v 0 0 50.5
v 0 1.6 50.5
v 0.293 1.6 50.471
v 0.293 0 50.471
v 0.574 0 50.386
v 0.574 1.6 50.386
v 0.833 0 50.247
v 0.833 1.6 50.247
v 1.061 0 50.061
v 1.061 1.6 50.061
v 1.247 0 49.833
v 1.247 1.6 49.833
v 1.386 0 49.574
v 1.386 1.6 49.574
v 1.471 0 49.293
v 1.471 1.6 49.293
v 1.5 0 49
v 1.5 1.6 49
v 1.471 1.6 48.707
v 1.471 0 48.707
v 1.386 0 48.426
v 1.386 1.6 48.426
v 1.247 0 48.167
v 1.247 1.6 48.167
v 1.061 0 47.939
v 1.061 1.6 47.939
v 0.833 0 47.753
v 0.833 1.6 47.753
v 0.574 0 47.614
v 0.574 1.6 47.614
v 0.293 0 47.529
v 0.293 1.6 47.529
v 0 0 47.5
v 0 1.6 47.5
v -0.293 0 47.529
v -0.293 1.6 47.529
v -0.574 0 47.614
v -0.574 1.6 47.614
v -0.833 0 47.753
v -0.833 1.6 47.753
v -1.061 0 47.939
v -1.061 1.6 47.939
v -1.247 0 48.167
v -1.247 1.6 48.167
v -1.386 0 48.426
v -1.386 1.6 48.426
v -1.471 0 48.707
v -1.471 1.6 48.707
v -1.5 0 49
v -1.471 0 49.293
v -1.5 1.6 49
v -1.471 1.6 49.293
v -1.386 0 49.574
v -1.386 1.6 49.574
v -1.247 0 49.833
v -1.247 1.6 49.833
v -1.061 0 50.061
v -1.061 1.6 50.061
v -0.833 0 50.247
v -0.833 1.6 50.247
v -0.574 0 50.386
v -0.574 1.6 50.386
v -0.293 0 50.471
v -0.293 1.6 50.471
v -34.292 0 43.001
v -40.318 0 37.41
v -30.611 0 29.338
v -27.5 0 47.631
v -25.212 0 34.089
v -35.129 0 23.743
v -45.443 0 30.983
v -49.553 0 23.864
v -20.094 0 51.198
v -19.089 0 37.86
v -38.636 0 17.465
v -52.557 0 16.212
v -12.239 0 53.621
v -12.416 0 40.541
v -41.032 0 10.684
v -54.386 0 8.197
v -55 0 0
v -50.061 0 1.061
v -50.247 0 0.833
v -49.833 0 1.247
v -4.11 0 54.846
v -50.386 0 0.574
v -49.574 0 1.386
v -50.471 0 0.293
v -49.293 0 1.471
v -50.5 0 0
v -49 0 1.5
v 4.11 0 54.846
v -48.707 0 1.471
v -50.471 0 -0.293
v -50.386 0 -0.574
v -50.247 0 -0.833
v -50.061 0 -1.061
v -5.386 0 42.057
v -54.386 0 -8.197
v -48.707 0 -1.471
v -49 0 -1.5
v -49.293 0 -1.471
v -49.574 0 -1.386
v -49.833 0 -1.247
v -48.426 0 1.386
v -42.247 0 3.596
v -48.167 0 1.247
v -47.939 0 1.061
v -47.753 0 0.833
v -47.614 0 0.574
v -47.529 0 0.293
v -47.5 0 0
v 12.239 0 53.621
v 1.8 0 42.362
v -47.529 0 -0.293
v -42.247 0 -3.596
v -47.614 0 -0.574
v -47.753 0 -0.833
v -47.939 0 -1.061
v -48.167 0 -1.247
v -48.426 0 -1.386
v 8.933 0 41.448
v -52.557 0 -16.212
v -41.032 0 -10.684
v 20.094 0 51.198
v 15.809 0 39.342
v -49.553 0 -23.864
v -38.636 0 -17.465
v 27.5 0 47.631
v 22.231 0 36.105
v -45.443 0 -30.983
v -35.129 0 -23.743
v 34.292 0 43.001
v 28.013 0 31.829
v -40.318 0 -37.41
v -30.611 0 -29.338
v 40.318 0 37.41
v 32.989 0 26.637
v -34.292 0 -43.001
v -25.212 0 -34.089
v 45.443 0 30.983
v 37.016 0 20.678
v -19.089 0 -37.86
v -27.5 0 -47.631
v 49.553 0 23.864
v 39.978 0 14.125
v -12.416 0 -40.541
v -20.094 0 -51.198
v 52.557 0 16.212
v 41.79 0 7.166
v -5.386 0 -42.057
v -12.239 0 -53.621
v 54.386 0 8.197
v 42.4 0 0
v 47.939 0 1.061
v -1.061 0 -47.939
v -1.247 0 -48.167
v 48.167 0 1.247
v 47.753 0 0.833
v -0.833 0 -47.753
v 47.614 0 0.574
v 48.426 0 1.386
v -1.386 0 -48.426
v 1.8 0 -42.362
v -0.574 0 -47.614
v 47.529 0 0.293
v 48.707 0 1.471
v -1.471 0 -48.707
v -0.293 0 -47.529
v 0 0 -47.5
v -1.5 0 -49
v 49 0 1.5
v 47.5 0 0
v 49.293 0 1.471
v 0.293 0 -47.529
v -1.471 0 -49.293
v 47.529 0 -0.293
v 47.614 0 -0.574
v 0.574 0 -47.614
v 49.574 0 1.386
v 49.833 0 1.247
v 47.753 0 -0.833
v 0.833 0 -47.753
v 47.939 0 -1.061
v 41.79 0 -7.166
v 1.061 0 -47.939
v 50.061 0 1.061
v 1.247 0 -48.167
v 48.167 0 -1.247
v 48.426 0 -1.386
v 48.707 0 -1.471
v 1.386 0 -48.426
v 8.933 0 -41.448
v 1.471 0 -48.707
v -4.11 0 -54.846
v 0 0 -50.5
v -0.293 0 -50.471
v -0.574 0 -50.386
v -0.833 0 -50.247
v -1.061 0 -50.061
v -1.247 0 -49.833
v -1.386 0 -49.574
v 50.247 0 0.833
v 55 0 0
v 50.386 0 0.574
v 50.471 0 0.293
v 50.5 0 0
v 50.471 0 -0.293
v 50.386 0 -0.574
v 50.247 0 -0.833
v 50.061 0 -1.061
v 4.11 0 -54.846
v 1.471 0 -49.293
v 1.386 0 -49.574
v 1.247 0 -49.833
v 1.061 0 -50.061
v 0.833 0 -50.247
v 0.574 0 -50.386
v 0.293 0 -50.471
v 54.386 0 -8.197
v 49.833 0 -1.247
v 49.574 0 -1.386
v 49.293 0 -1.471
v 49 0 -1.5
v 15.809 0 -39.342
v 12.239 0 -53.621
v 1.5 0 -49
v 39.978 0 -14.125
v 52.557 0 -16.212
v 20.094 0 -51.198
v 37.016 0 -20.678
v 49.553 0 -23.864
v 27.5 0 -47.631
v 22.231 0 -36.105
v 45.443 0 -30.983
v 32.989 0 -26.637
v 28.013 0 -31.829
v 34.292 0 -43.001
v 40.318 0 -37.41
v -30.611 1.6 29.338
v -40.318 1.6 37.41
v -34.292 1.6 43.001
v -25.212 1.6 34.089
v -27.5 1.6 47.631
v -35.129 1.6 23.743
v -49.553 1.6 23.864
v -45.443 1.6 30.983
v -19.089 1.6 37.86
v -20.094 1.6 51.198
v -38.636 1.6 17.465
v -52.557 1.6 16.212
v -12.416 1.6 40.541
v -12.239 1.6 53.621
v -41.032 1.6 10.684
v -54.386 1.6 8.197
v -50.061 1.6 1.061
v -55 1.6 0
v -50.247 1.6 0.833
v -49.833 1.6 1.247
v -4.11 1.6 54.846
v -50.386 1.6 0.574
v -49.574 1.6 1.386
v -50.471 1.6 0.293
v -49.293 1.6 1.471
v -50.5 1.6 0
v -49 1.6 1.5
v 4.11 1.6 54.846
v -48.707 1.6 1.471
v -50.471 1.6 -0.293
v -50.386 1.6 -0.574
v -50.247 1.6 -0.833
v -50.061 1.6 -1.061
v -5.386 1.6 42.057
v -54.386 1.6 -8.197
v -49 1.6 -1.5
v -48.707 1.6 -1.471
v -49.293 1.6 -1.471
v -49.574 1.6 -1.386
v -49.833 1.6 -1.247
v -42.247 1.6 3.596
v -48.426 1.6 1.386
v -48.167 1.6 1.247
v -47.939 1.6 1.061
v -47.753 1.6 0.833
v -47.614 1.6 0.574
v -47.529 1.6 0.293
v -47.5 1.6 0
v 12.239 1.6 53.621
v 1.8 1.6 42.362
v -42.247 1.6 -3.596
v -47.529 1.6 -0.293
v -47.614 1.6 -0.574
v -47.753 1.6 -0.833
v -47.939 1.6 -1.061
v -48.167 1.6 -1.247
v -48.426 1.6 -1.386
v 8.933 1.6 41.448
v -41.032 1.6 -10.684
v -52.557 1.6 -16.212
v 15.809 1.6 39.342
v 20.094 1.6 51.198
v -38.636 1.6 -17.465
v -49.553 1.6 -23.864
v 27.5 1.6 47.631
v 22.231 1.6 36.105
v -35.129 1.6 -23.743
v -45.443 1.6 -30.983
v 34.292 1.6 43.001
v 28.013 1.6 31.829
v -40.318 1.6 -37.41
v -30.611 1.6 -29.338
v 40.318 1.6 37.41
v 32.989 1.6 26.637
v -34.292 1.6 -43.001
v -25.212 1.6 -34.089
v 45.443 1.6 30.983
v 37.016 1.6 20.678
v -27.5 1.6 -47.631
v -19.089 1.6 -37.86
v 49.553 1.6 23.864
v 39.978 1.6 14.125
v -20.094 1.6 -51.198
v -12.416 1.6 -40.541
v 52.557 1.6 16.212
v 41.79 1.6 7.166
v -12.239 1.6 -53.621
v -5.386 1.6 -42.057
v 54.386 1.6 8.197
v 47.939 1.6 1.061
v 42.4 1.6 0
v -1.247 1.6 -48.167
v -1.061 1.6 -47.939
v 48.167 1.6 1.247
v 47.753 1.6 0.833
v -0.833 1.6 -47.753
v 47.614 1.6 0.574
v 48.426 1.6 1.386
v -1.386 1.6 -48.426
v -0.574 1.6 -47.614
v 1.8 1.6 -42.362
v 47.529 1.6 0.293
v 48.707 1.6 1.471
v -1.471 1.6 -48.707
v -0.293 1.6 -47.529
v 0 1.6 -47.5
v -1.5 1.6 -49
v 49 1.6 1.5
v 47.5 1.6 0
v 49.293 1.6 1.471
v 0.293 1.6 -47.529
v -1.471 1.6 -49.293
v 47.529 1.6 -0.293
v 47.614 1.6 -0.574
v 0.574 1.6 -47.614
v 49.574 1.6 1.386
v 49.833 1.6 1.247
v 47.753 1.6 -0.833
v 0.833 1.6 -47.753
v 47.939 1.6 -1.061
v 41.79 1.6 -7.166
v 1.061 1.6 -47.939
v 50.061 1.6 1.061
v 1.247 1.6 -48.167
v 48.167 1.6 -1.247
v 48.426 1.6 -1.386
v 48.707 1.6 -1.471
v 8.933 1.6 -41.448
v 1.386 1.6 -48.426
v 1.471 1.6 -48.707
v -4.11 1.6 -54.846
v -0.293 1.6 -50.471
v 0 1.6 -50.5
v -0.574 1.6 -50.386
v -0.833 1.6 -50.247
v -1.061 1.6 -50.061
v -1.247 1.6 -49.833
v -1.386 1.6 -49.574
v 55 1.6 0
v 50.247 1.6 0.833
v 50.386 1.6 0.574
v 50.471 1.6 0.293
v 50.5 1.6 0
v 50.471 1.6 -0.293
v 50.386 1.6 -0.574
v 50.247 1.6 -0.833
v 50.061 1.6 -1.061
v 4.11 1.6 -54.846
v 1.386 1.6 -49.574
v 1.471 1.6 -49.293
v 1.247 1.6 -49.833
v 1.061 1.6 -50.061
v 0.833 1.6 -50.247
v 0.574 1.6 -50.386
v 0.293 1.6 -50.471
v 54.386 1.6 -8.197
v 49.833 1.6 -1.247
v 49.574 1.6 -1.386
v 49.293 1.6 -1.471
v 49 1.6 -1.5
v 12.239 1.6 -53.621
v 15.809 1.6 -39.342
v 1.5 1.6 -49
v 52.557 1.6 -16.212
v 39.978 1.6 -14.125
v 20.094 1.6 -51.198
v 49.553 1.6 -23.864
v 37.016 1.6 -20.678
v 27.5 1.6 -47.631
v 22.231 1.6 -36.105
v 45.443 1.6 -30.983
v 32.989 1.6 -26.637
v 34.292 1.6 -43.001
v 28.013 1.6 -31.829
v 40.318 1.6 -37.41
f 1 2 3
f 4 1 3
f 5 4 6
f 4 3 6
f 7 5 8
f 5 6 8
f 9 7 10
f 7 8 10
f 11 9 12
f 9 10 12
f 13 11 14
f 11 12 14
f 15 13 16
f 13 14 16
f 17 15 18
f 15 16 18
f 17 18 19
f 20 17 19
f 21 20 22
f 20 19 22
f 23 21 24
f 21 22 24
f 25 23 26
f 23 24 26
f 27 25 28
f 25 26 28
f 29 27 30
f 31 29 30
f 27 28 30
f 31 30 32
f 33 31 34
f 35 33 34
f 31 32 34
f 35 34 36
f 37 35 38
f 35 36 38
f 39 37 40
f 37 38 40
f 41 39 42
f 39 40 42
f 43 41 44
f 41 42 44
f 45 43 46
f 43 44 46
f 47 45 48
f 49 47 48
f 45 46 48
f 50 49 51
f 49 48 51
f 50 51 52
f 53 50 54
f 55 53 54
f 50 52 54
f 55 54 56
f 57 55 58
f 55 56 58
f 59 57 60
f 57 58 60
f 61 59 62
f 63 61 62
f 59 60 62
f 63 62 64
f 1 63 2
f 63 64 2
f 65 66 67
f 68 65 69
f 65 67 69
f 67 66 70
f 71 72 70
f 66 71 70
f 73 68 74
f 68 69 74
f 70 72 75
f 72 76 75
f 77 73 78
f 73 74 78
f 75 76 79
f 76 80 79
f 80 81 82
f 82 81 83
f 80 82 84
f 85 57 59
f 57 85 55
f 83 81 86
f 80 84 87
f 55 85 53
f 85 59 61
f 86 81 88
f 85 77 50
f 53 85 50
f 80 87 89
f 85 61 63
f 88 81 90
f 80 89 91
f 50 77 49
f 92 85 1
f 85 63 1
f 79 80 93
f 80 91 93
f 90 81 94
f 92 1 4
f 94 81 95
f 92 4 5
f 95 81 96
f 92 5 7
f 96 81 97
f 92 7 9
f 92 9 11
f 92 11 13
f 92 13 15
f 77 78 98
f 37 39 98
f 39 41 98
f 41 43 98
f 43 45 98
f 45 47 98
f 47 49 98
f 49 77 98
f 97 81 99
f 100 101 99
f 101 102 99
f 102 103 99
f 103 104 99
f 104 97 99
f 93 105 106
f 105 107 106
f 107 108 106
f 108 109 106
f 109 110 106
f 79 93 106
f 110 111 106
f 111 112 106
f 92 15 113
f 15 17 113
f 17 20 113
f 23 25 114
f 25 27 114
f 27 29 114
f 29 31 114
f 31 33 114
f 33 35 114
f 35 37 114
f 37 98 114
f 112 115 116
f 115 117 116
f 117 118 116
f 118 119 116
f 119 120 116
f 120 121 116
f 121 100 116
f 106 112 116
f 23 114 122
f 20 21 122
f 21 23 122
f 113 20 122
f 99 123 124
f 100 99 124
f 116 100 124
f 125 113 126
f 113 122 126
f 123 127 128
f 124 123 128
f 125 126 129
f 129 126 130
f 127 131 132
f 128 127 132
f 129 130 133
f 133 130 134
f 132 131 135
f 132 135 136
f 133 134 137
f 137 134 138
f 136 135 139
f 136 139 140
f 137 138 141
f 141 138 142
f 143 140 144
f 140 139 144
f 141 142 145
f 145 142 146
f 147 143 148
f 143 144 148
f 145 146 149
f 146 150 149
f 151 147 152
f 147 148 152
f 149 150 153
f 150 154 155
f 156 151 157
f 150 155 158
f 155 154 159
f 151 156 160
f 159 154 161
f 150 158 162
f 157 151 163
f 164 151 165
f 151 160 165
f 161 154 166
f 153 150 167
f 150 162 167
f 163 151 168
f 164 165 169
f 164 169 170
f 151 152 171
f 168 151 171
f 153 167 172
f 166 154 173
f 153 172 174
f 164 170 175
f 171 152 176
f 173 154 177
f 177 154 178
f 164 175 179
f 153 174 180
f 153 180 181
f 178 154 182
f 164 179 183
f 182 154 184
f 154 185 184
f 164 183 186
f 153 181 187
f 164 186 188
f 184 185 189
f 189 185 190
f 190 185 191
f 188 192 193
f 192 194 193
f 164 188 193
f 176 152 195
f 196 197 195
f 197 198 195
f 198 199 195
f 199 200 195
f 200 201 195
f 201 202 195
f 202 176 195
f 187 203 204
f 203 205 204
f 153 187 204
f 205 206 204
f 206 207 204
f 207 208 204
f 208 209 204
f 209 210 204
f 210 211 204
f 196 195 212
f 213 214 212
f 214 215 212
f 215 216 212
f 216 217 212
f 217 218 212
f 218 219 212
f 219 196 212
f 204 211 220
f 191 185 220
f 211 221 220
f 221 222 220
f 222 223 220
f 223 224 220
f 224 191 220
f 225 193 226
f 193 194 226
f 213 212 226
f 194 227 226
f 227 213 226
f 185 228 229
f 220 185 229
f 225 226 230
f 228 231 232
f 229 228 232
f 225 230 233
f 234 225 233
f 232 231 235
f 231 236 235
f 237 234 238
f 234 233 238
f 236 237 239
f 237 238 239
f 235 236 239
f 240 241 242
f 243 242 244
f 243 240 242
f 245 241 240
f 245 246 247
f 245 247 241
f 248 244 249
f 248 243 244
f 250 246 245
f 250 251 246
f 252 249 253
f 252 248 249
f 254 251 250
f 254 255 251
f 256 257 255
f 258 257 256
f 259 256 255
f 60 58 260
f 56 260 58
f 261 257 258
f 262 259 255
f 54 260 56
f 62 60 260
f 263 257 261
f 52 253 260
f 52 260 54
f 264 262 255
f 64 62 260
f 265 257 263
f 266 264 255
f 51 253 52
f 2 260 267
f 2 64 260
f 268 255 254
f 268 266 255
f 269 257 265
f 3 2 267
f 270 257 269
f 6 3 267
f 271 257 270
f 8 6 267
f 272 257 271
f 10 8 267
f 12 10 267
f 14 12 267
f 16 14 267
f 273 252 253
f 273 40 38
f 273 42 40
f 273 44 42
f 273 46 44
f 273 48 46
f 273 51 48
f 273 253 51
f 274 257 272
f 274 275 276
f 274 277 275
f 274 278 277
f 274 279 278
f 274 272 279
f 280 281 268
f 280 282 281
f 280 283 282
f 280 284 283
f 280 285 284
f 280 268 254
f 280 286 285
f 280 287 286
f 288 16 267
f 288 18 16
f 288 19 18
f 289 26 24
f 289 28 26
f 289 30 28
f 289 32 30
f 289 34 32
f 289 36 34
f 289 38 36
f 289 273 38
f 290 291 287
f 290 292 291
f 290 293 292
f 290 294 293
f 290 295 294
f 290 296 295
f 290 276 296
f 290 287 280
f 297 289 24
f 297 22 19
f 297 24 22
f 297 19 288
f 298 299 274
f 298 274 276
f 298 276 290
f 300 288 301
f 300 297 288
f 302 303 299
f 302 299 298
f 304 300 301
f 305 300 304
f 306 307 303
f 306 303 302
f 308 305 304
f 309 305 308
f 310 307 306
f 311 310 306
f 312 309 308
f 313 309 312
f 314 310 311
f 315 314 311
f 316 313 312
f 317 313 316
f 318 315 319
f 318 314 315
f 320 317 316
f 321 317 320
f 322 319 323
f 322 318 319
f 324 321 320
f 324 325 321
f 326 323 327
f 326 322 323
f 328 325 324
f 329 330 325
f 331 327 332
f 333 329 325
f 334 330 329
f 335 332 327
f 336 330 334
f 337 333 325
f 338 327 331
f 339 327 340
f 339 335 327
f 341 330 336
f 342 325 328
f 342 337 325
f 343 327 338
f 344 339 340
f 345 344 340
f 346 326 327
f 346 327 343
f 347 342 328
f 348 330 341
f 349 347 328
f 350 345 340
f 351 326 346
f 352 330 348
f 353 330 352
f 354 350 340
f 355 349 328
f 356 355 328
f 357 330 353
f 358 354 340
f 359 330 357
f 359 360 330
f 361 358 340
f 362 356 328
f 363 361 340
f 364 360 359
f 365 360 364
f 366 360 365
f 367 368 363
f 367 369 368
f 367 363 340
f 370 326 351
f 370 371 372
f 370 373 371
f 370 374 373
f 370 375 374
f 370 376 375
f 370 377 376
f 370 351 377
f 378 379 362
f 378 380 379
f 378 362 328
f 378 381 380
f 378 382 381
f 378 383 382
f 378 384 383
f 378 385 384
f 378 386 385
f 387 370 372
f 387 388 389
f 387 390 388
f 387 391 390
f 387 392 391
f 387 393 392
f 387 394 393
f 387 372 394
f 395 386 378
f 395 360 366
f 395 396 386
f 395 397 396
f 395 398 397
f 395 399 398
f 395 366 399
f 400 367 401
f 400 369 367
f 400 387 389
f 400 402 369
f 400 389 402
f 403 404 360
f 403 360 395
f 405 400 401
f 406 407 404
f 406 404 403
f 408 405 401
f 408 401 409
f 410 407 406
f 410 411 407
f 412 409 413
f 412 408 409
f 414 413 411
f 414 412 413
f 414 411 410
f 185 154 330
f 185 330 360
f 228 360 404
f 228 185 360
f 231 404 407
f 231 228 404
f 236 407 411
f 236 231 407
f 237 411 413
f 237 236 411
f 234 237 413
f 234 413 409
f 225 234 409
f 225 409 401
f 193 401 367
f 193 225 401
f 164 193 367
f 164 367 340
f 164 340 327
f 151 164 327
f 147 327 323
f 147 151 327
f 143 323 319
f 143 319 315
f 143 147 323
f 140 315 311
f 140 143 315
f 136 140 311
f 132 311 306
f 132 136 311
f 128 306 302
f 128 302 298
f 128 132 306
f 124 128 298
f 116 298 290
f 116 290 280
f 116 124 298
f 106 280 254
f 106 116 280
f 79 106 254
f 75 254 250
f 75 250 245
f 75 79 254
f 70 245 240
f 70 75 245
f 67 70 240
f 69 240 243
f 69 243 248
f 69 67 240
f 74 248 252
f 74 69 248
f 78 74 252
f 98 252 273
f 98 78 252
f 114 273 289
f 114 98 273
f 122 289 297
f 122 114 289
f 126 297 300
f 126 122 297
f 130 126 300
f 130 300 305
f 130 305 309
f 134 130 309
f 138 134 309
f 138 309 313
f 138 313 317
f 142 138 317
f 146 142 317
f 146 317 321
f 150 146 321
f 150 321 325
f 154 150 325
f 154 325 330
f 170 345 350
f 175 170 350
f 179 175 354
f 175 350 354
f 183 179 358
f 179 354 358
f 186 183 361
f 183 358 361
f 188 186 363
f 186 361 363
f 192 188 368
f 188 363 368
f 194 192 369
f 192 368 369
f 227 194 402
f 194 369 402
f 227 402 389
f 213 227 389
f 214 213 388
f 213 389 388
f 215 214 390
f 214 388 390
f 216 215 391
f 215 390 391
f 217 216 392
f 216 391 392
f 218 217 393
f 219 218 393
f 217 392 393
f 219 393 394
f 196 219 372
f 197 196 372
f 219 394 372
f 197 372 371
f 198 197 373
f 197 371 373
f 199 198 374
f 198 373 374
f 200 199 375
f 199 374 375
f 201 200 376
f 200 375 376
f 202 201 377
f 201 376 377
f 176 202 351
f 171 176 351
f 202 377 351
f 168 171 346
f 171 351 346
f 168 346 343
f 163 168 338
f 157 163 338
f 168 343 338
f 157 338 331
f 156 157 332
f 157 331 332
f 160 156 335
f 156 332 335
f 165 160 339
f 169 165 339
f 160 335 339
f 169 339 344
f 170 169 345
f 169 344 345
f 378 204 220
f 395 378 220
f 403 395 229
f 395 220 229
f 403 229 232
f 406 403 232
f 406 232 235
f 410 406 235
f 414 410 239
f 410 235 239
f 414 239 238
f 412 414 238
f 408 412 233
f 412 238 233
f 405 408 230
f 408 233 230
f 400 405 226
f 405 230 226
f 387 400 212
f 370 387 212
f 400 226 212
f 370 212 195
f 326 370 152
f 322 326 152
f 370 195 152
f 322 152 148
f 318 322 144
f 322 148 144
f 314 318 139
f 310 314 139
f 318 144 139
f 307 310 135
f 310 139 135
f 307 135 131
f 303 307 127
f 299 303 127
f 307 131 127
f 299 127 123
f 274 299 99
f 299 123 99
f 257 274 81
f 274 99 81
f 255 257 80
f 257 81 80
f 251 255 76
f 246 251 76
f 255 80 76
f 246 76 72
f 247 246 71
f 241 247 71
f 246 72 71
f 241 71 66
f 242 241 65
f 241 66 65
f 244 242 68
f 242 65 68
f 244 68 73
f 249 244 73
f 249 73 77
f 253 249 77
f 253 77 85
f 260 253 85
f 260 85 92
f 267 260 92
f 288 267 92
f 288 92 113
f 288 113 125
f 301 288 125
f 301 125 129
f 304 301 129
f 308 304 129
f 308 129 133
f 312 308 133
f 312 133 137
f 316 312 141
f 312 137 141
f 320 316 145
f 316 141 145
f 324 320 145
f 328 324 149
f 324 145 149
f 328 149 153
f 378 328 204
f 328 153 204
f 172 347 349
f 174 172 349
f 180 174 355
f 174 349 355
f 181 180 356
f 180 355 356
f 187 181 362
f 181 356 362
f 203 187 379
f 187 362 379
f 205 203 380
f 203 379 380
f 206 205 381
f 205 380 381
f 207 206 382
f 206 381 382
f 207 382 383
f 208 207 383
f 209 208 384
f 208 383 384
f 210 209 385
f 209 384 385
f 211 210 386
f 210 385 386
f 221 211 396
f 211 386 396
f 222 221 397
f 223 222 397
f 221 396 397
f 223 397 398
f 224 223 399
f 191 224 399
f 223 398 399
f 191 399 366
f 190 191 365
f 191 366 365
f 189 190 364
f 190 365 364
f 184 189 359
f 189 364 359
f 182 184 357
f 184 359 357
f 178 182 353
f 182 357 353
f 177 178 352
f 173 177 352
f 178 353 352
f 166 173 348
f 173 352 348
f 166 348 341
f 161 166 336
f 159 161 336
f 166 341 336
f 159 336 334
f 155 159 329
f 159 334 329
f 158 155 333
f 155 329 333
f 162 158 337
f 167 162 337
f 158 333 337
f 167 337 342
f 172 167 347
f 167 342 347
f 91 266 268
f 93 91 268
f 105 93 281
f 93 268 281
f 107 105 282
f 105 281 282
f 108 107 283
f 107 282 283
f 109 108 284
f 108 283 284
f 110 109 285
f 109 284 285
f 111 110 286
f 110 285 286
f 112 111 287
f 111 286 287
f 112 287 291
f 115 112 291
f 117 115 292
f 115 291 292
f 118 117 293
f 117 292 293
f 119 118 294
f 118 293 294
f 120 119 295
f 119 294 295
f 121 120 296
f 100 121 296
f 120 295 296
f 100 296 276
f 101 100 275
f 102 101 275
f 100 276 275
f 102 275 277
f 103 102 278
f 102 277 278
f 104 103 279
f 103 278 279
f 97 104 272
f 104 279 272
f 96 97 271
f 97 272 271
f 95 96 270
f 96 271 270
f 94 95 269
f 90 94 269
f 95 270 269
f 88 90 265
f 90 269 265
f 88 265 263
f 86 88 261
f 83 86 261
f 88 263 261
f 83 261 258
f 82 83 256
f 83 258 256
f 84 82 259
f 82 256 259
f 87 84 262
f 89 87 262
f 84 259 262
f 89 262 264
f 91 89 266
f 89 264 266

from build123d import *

# Parameters (mm, degrees)
SKETCH_1_R          = 55
SKETCH_1_R_2        = 42.4
EXTRUDE_1_DEPTH     = 1.6
SKETCH_2_R          = 1.5
CUT_EXTRUDE_1_DEPTH = 1.6


with BuildPart() as part:
    # 草图1 → 拉伸-薄壁1 (new body)
    with BuildSketch(Plane(origin=(0, 0, 0), x_dir=(1, 0, 0), z_dir=(0, 1, 0))):
        Circle(SKETCH_1_R)
        Circle(SKETCH_1_R_2, mode=Mode.SUBTRACT)
    extrude(amount=EXTRUDE_1_DEPTH)

    # 草图2 → 切除-拉伸1 (cut)
    with BuildSketch(Plane(origin=(0, 1.6, 0), x_dir=(1, 0, 0), z_dir=(0, 1, 0))):
        with Locations(Location((-49, 0, 0), (0, 0, 270))):
            Circle(SKETCH_2_R)
        with Locations(Location((0, 49, 0), (0, 0, 270))):
            Circle(SKETCH_2_R)
        with Locations(Location((49, 0, 0), (0, 0, 270))):
            Circle(SKETCH_2_R)
        with Locations(Location((0, -49, 0), (0, 0, 270))):
            Circle(SKETCH_2_R)
    extrude(amount=-CUT_EXTRUDE_1_DEPTH, mode=Mode.SUBTRACT)


solid = part.part
